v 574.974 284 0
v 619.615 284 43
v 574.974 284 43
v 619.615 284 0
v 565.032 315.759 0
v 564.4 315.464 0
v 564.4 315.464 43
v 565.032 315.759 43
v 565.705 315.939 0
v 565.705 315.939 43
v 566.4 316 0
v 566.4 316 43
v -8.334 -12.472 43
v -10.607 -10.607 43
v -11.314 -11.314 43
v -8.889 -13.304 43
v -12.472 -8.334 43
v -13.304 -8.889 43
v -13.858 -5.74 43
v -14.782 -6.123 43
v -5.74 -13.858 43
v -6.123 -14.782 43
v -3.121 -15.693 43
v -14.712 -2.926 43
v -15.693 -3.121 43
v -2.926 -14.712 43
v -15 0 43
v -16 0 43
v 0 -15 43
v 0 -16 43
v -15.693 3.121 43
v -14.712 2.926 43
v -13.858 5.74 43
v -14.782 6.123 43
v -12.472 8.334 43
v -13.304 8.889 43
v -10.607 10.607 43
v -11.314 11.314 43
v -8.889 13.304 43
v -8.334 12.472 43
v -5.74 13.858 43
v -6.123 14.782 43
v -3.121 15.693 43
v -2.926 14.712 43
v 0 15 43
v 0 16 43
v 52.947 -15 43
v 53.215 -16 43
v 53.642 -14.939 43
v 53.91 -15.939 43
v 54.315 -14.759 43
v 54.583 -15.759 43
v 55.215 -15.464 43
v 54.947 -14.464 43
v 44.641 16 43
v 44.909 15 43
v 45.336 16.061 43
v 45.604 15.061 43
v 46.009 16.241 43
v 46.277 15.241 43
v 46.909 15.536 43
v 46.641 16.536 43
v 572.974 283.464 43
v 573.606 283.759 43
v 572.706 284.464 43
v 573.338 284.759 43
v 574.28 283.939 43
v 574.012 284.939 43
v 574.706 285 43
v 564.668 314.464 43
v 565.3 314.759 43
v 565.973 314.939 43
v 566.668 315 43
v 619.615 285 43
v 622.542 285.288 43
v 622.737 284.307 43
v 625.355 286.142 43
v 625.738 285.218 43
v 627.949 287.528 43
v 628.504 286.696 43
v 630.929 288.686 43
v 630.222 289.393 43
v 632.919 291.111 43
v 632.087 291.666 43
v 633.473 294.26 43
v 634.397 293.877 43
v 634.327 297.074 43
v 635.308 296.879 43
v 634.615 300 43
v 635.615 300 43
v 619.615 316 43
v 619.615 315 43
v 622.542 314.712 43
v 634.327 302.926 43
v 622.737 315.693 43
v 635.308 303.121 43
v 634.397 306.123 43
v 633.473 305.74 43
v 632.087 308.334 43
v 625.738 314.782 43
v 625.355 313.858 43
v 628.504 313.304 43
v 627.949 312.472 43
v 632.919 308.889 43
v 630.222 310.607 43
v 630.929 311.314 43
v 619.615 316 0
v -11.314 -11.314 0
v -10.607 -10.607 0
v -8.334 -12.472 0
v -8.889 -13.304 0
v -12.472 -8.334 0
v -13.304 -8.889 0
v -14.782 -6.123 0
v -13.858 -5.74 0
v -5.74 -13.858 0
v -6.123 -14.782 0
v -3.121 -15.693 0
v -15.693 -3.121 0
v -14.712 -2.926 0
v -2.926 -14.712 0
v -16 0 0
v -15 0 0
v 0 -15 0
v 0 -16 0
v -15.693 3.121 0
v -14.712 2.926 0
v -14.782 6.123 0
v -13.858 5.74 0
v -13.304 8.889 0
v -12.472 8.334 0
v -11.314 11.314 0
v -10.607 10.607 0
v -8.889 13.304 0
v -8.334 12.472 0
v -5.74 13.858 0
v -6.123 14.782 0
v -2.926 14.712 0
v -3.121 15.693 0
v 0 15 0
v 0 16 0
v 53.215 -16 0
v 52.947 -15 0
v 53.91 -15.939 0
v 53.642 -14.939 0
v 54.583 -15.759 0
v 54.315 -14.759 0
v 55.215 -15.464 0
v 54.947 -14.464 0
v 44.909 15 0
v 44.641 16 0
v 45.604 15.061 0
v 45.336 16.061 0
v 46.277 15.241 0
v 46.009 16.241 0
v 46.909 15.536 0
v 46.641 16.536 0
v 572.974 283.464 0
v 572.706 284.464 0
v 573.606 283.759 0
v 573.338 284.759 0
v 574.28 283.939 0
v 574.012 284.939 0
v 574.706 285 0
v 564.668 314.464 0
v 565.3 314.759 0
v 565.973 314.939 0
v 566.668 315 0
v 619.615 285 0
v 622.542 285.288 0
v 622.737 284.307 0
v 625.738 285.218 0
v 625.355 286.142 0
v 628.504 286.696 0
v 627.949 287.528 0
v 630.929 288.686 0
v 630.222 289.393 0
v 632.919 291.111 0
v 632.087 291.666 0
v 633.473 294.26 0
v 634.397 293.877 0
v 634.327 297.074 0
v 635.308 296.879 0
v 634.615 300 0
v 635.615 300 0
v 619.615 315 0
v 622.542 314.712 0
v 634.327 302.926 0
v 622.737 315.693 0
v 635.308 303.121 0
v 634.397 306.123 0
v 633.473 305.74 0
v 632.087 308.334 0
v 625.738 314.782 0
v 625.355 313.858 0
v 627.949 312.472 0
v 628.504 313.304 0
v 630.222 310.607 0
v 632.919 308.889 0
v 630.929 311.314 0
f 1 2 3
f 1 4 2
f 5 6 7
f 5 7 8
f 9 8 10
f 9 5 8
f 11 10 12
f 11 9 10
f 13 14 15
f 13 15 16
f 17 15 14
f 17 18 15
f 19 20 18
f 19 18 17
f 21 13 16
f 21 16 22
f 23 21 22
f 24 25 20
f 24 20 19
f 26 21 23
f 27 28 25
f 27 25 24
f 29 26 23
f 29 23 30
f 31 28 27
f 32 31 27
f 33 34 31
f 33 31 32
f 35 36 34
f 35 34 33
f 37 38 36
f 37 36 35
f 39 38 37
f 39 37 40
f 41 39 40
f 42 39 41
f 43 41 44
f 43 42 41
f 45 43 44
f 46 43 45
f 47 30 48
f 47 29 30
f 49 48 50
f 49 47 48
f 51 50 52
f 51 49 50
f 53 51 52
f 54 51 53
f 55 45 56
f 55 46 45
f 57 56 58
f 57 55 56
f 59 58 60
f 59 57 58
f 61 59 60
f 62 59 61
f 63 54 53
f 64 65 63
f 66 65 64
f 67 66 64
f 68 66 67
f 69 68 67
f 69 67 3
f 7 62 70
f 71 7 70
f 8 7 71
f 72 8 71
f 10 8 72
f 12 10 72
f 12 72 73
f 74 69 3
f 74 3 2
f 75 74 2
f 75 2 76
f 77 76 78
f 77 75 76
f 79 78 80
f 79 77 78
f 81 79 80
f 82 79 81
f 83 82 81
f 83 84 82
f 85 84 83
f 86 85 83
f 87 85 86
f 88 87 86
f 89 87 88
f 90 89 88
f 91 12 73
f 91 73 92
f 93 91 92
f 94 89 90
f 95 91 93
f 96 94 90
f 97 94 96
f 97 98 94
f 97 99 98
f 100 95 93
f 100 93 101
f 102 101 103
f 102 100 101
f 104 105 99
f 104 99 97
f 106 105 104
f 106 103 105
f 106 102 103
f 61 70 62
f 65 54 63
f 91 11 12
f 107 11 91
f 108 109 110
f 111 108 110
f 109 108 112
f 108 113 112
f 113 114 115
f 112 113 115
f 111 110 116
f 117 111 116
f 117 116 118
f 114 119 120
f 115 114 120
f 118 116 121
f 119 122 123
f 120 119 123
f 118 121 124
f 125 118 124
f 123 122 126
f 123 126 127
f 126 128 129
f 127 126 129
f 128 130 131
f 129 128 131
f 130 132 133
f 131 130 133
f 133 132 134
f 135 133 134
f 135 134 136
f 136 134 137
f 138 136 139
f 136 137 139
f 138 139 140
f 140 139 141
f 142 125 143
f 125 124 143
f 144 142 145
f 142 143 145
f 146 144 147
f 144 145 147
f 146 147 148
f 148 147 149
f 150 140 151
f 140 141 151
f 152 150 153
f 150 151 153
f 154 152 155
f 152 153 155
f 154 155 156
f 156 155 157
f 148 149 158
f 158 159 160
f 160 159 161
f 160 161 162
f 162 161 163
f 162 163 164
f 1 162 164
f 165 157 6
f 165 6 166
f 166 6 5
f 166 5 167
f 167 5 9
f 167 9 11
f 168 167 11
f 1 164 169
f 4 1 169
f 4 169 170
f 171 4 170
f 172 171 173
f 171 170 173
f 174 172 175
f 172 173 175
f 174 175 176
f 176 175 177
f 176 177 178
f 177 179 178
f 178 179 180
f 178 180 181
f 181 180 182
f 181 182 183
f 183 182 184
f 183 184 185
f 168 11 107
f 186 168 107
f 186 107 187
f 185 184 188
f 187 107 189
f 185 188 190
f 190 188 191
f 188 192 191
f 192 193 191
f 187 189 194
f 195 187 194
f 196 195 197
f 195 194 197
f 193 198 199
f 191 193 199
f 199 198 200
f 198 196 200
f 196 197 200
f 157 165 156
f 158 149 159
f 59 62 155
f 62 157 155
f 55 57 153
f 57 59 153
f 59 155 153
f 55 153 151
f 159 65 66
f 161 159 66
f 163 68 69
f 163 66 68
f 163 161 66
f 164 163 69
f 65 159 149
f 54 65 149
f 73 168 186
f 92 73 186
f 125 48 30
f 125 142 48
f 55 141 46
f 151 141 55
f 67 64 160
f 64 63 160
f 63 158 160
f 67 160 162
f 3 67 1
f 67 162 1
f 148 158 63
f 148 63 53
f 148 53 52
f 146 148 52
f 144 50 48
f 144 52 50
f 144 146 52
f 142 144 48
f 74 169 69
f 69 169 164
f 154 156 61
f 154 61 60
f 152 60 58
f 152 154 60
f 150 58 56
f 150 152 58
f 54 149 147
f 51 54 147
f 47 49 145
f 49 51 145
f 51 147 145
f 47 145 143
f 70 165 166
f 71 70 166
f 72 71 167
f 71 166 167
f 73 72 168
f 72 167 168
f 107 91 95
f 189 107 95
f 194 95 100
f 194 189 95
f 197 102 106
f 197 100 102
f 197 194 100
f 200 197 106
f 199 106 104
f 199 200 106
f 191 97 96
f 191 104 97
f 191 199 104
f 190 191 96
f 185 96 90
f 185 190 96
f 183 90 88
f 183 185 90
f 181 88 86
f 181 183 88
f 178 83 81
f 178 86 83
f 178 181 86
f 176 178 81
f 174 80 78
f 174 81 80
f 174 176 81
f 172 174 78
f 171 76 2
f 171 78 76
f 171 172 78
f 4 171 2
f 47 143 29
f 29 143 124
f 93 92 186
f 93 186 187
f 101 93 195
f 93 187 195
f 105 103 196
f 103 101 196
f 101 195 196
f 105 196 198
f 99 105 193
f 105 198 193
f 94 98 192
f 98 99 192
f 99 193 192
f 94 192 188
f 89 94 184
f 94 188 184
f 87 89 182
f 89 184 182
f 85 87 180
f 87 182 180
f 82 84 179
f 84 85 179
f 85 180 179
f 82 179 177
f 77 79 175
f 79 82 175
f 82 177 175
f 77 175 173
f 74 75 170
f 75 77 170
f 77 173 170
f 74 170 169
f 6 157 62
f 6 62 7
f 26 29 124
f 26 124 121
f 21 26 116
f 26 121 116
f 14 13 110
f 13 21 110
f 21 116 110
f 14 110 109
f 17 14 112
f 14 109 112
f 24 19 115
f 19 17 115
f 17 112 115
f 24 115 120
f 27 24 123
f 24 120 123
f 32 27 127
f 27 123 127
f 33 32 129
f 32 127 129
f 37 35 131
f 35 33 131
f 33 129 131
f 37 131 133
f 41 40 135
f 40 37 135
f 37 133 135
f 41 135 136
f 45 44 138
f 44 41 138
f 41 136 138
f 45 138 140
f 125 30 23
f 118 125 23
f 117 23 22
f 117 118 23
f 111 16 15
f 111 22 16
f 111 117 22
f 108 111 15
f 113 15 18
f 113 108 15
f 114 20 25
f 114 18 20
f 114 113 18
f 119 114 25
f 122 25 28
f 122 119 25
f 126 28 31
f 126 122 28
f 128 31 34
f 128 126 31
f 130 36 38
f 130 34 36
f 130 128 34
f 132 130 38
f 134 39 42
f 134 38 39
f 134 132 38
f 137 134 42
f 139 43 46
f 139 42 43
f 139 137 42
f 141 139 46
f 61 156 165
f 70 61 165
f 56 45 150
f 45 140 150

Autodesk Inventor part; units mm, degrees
ref_plane "YZ Plane" through (0, 0, 0) normal (1, 0, 0) x (0, 1, 0)
ref_plane "XZ Plane" through (0, 0, 0) normal (0, 1, 0) x (-1, 0, 0)
ref_plane "XY Plane" through (0, 0, 0) normal (0, 0, 1) x (1, 0, 0)
sketch "Sketch1" plane through (0, 0, 0) normal (0, 0, 1) x (1, 0, 0)
  point P0 (0, 0)
sketch "Sketch2" plane through (0, 0, 0) normal (0, 0, 1) x (1, 0, 0)
  arc A0 (0, 15.5) -> (0, -15.5) centre (0, 0) ccw
  line L0 (0, 0) -> (50, 0) construction
  line L1 (50, 0) -> (569.6152, 300) construction
  line L2 (569.6152, 300) -> (619.6152, 300) construction
  arc A1 (619.6152, 284.5) -> (619.6152, 315.5) centre (619.6152, 300) ccw
  line L3 (619.6152, 315.5) -> (566.5338, 315.5)
  line L4 (564.5338, 314.9641) -> (46.775, 16.0359)
  line L5 (44.775, 15.5) -> (0, 15.5)
  line L6 (619.6152, 284.5) -> (574.8403, 284.5)
  line L7 (572.8403, 283.9641) -> (55.0814, -14.9641)
  line L8 (53.0814, -15.5) -> (0, -15.5)
  line L9 (46.641, 16.5359) -> (564.3999, 315.4641)
  line L10 (566.3999, 316) -> (619.6152, 316)
  arc A2 (619.6152, 284) -> (619.6152, 316) centre (619.6152, 300) ccw
  line L11 (619.6152, 284) -> (574.9742, 284)
  line L12 (572.9742, 283.4641) -> (55.2154, -15.4641)
  line L13 (53.2154, -16) -> (0, -16)
  arc A3 (0, 16) -> (0, -16) centre (0, 0) ccw
  line L14 (0, 16) -> (44.641, 16)
  line L15 (0, 15) -> (44.909, 15)
  line L16 (46.909, 15.5359) -> (564.6678, 314.4641)
  line L17 (566.6678, 315) -> (619.6152, 315)
  arc A4 (619.6152, 285) -> (619.6152, 315) centre (619.6152, 300) ccw
  line L18 (619.6152, 285) -> (574.7063, 285)
  line L19 (572.7063, 284.4641) -> (54.9474, -14.4641)
  line L20 (52.9474, -15) -> (0, -15)
  arc A5 (0, 15) -> (0, -15) centre (0, 0) ccw
  arc A6 (44.641, 16) -> (46.641, 16.5359) centre (44.641, 20) ccw
  arc A7 (44.775, 15.5) -> (46.775, 16.0359) centre (44.775, 19.5) ccw
  arc A8 (44.909, 15) -> (46.909, 15.5359) centre (44.909, 19) ccw
  arc A9 (52.9474, -15) -> (54.9474, -14.4641) centre (52.9474, -11) ccw
  arc A10 (53.0814, -15.5) -> (55.0814, -14.9641) centre (53.0814, -11.5) ccw
  arc A11 (53.2154, -16) -> (55.2154, -15.4641) centre (53.2154, -12) ccw
  arc A12 (574.7063, 285) -> (572.7063, 284.4641) centre (574.7063, 281) ccw
  arc A13 (574.8403, 284.5) -> (572.8403, 283.9641) centre (574.8403, 280.5) ccw
  arc A14 (574.9742, 284) -> (572.9742, 283.4641) centre (574.9742, 280) ccw
  arc A15 (566.3999, 316) -> (564.3999, 315.4641) centre (566.3999, 312) ccw
  arc A16 (566.5338, 315.5) -> (564.5338, 314.9641) centre (566.5338, 311.5) ccw
  arc A17 (566.6678, 315) -> (564.6678, 314.4641) centre (566.6678, 311) ccw
  dimension "d0" = 31
  dimension "d1" = 50
  dimension "d2" = 600
  dimension "d3" = 150
  dimension "d4" = 50
  dimension "d5" = 31
  dimension "d6" = 4
  dimension "d7" = 4
  dimension "d8" = 4
  dimension "d9" = 4
  dimension "d10" = 4
  dimension "d11" = 4
  dimension "d12" = 4
  dimension "d13" = 4
  dimension "d14" = 4
  dimension "d15" = 4
extrude "Extrusion1" add sketch "Sketch2" along normal blind 43 contours L5 A7 L4 A16 L3 A1 L6 A13 L7 A10 L8 A0 | L9 A15 L10 A2 L11 A14 L12 A11 L13 A3 L14 A6
properties part number "Assembly belt For lifting"
